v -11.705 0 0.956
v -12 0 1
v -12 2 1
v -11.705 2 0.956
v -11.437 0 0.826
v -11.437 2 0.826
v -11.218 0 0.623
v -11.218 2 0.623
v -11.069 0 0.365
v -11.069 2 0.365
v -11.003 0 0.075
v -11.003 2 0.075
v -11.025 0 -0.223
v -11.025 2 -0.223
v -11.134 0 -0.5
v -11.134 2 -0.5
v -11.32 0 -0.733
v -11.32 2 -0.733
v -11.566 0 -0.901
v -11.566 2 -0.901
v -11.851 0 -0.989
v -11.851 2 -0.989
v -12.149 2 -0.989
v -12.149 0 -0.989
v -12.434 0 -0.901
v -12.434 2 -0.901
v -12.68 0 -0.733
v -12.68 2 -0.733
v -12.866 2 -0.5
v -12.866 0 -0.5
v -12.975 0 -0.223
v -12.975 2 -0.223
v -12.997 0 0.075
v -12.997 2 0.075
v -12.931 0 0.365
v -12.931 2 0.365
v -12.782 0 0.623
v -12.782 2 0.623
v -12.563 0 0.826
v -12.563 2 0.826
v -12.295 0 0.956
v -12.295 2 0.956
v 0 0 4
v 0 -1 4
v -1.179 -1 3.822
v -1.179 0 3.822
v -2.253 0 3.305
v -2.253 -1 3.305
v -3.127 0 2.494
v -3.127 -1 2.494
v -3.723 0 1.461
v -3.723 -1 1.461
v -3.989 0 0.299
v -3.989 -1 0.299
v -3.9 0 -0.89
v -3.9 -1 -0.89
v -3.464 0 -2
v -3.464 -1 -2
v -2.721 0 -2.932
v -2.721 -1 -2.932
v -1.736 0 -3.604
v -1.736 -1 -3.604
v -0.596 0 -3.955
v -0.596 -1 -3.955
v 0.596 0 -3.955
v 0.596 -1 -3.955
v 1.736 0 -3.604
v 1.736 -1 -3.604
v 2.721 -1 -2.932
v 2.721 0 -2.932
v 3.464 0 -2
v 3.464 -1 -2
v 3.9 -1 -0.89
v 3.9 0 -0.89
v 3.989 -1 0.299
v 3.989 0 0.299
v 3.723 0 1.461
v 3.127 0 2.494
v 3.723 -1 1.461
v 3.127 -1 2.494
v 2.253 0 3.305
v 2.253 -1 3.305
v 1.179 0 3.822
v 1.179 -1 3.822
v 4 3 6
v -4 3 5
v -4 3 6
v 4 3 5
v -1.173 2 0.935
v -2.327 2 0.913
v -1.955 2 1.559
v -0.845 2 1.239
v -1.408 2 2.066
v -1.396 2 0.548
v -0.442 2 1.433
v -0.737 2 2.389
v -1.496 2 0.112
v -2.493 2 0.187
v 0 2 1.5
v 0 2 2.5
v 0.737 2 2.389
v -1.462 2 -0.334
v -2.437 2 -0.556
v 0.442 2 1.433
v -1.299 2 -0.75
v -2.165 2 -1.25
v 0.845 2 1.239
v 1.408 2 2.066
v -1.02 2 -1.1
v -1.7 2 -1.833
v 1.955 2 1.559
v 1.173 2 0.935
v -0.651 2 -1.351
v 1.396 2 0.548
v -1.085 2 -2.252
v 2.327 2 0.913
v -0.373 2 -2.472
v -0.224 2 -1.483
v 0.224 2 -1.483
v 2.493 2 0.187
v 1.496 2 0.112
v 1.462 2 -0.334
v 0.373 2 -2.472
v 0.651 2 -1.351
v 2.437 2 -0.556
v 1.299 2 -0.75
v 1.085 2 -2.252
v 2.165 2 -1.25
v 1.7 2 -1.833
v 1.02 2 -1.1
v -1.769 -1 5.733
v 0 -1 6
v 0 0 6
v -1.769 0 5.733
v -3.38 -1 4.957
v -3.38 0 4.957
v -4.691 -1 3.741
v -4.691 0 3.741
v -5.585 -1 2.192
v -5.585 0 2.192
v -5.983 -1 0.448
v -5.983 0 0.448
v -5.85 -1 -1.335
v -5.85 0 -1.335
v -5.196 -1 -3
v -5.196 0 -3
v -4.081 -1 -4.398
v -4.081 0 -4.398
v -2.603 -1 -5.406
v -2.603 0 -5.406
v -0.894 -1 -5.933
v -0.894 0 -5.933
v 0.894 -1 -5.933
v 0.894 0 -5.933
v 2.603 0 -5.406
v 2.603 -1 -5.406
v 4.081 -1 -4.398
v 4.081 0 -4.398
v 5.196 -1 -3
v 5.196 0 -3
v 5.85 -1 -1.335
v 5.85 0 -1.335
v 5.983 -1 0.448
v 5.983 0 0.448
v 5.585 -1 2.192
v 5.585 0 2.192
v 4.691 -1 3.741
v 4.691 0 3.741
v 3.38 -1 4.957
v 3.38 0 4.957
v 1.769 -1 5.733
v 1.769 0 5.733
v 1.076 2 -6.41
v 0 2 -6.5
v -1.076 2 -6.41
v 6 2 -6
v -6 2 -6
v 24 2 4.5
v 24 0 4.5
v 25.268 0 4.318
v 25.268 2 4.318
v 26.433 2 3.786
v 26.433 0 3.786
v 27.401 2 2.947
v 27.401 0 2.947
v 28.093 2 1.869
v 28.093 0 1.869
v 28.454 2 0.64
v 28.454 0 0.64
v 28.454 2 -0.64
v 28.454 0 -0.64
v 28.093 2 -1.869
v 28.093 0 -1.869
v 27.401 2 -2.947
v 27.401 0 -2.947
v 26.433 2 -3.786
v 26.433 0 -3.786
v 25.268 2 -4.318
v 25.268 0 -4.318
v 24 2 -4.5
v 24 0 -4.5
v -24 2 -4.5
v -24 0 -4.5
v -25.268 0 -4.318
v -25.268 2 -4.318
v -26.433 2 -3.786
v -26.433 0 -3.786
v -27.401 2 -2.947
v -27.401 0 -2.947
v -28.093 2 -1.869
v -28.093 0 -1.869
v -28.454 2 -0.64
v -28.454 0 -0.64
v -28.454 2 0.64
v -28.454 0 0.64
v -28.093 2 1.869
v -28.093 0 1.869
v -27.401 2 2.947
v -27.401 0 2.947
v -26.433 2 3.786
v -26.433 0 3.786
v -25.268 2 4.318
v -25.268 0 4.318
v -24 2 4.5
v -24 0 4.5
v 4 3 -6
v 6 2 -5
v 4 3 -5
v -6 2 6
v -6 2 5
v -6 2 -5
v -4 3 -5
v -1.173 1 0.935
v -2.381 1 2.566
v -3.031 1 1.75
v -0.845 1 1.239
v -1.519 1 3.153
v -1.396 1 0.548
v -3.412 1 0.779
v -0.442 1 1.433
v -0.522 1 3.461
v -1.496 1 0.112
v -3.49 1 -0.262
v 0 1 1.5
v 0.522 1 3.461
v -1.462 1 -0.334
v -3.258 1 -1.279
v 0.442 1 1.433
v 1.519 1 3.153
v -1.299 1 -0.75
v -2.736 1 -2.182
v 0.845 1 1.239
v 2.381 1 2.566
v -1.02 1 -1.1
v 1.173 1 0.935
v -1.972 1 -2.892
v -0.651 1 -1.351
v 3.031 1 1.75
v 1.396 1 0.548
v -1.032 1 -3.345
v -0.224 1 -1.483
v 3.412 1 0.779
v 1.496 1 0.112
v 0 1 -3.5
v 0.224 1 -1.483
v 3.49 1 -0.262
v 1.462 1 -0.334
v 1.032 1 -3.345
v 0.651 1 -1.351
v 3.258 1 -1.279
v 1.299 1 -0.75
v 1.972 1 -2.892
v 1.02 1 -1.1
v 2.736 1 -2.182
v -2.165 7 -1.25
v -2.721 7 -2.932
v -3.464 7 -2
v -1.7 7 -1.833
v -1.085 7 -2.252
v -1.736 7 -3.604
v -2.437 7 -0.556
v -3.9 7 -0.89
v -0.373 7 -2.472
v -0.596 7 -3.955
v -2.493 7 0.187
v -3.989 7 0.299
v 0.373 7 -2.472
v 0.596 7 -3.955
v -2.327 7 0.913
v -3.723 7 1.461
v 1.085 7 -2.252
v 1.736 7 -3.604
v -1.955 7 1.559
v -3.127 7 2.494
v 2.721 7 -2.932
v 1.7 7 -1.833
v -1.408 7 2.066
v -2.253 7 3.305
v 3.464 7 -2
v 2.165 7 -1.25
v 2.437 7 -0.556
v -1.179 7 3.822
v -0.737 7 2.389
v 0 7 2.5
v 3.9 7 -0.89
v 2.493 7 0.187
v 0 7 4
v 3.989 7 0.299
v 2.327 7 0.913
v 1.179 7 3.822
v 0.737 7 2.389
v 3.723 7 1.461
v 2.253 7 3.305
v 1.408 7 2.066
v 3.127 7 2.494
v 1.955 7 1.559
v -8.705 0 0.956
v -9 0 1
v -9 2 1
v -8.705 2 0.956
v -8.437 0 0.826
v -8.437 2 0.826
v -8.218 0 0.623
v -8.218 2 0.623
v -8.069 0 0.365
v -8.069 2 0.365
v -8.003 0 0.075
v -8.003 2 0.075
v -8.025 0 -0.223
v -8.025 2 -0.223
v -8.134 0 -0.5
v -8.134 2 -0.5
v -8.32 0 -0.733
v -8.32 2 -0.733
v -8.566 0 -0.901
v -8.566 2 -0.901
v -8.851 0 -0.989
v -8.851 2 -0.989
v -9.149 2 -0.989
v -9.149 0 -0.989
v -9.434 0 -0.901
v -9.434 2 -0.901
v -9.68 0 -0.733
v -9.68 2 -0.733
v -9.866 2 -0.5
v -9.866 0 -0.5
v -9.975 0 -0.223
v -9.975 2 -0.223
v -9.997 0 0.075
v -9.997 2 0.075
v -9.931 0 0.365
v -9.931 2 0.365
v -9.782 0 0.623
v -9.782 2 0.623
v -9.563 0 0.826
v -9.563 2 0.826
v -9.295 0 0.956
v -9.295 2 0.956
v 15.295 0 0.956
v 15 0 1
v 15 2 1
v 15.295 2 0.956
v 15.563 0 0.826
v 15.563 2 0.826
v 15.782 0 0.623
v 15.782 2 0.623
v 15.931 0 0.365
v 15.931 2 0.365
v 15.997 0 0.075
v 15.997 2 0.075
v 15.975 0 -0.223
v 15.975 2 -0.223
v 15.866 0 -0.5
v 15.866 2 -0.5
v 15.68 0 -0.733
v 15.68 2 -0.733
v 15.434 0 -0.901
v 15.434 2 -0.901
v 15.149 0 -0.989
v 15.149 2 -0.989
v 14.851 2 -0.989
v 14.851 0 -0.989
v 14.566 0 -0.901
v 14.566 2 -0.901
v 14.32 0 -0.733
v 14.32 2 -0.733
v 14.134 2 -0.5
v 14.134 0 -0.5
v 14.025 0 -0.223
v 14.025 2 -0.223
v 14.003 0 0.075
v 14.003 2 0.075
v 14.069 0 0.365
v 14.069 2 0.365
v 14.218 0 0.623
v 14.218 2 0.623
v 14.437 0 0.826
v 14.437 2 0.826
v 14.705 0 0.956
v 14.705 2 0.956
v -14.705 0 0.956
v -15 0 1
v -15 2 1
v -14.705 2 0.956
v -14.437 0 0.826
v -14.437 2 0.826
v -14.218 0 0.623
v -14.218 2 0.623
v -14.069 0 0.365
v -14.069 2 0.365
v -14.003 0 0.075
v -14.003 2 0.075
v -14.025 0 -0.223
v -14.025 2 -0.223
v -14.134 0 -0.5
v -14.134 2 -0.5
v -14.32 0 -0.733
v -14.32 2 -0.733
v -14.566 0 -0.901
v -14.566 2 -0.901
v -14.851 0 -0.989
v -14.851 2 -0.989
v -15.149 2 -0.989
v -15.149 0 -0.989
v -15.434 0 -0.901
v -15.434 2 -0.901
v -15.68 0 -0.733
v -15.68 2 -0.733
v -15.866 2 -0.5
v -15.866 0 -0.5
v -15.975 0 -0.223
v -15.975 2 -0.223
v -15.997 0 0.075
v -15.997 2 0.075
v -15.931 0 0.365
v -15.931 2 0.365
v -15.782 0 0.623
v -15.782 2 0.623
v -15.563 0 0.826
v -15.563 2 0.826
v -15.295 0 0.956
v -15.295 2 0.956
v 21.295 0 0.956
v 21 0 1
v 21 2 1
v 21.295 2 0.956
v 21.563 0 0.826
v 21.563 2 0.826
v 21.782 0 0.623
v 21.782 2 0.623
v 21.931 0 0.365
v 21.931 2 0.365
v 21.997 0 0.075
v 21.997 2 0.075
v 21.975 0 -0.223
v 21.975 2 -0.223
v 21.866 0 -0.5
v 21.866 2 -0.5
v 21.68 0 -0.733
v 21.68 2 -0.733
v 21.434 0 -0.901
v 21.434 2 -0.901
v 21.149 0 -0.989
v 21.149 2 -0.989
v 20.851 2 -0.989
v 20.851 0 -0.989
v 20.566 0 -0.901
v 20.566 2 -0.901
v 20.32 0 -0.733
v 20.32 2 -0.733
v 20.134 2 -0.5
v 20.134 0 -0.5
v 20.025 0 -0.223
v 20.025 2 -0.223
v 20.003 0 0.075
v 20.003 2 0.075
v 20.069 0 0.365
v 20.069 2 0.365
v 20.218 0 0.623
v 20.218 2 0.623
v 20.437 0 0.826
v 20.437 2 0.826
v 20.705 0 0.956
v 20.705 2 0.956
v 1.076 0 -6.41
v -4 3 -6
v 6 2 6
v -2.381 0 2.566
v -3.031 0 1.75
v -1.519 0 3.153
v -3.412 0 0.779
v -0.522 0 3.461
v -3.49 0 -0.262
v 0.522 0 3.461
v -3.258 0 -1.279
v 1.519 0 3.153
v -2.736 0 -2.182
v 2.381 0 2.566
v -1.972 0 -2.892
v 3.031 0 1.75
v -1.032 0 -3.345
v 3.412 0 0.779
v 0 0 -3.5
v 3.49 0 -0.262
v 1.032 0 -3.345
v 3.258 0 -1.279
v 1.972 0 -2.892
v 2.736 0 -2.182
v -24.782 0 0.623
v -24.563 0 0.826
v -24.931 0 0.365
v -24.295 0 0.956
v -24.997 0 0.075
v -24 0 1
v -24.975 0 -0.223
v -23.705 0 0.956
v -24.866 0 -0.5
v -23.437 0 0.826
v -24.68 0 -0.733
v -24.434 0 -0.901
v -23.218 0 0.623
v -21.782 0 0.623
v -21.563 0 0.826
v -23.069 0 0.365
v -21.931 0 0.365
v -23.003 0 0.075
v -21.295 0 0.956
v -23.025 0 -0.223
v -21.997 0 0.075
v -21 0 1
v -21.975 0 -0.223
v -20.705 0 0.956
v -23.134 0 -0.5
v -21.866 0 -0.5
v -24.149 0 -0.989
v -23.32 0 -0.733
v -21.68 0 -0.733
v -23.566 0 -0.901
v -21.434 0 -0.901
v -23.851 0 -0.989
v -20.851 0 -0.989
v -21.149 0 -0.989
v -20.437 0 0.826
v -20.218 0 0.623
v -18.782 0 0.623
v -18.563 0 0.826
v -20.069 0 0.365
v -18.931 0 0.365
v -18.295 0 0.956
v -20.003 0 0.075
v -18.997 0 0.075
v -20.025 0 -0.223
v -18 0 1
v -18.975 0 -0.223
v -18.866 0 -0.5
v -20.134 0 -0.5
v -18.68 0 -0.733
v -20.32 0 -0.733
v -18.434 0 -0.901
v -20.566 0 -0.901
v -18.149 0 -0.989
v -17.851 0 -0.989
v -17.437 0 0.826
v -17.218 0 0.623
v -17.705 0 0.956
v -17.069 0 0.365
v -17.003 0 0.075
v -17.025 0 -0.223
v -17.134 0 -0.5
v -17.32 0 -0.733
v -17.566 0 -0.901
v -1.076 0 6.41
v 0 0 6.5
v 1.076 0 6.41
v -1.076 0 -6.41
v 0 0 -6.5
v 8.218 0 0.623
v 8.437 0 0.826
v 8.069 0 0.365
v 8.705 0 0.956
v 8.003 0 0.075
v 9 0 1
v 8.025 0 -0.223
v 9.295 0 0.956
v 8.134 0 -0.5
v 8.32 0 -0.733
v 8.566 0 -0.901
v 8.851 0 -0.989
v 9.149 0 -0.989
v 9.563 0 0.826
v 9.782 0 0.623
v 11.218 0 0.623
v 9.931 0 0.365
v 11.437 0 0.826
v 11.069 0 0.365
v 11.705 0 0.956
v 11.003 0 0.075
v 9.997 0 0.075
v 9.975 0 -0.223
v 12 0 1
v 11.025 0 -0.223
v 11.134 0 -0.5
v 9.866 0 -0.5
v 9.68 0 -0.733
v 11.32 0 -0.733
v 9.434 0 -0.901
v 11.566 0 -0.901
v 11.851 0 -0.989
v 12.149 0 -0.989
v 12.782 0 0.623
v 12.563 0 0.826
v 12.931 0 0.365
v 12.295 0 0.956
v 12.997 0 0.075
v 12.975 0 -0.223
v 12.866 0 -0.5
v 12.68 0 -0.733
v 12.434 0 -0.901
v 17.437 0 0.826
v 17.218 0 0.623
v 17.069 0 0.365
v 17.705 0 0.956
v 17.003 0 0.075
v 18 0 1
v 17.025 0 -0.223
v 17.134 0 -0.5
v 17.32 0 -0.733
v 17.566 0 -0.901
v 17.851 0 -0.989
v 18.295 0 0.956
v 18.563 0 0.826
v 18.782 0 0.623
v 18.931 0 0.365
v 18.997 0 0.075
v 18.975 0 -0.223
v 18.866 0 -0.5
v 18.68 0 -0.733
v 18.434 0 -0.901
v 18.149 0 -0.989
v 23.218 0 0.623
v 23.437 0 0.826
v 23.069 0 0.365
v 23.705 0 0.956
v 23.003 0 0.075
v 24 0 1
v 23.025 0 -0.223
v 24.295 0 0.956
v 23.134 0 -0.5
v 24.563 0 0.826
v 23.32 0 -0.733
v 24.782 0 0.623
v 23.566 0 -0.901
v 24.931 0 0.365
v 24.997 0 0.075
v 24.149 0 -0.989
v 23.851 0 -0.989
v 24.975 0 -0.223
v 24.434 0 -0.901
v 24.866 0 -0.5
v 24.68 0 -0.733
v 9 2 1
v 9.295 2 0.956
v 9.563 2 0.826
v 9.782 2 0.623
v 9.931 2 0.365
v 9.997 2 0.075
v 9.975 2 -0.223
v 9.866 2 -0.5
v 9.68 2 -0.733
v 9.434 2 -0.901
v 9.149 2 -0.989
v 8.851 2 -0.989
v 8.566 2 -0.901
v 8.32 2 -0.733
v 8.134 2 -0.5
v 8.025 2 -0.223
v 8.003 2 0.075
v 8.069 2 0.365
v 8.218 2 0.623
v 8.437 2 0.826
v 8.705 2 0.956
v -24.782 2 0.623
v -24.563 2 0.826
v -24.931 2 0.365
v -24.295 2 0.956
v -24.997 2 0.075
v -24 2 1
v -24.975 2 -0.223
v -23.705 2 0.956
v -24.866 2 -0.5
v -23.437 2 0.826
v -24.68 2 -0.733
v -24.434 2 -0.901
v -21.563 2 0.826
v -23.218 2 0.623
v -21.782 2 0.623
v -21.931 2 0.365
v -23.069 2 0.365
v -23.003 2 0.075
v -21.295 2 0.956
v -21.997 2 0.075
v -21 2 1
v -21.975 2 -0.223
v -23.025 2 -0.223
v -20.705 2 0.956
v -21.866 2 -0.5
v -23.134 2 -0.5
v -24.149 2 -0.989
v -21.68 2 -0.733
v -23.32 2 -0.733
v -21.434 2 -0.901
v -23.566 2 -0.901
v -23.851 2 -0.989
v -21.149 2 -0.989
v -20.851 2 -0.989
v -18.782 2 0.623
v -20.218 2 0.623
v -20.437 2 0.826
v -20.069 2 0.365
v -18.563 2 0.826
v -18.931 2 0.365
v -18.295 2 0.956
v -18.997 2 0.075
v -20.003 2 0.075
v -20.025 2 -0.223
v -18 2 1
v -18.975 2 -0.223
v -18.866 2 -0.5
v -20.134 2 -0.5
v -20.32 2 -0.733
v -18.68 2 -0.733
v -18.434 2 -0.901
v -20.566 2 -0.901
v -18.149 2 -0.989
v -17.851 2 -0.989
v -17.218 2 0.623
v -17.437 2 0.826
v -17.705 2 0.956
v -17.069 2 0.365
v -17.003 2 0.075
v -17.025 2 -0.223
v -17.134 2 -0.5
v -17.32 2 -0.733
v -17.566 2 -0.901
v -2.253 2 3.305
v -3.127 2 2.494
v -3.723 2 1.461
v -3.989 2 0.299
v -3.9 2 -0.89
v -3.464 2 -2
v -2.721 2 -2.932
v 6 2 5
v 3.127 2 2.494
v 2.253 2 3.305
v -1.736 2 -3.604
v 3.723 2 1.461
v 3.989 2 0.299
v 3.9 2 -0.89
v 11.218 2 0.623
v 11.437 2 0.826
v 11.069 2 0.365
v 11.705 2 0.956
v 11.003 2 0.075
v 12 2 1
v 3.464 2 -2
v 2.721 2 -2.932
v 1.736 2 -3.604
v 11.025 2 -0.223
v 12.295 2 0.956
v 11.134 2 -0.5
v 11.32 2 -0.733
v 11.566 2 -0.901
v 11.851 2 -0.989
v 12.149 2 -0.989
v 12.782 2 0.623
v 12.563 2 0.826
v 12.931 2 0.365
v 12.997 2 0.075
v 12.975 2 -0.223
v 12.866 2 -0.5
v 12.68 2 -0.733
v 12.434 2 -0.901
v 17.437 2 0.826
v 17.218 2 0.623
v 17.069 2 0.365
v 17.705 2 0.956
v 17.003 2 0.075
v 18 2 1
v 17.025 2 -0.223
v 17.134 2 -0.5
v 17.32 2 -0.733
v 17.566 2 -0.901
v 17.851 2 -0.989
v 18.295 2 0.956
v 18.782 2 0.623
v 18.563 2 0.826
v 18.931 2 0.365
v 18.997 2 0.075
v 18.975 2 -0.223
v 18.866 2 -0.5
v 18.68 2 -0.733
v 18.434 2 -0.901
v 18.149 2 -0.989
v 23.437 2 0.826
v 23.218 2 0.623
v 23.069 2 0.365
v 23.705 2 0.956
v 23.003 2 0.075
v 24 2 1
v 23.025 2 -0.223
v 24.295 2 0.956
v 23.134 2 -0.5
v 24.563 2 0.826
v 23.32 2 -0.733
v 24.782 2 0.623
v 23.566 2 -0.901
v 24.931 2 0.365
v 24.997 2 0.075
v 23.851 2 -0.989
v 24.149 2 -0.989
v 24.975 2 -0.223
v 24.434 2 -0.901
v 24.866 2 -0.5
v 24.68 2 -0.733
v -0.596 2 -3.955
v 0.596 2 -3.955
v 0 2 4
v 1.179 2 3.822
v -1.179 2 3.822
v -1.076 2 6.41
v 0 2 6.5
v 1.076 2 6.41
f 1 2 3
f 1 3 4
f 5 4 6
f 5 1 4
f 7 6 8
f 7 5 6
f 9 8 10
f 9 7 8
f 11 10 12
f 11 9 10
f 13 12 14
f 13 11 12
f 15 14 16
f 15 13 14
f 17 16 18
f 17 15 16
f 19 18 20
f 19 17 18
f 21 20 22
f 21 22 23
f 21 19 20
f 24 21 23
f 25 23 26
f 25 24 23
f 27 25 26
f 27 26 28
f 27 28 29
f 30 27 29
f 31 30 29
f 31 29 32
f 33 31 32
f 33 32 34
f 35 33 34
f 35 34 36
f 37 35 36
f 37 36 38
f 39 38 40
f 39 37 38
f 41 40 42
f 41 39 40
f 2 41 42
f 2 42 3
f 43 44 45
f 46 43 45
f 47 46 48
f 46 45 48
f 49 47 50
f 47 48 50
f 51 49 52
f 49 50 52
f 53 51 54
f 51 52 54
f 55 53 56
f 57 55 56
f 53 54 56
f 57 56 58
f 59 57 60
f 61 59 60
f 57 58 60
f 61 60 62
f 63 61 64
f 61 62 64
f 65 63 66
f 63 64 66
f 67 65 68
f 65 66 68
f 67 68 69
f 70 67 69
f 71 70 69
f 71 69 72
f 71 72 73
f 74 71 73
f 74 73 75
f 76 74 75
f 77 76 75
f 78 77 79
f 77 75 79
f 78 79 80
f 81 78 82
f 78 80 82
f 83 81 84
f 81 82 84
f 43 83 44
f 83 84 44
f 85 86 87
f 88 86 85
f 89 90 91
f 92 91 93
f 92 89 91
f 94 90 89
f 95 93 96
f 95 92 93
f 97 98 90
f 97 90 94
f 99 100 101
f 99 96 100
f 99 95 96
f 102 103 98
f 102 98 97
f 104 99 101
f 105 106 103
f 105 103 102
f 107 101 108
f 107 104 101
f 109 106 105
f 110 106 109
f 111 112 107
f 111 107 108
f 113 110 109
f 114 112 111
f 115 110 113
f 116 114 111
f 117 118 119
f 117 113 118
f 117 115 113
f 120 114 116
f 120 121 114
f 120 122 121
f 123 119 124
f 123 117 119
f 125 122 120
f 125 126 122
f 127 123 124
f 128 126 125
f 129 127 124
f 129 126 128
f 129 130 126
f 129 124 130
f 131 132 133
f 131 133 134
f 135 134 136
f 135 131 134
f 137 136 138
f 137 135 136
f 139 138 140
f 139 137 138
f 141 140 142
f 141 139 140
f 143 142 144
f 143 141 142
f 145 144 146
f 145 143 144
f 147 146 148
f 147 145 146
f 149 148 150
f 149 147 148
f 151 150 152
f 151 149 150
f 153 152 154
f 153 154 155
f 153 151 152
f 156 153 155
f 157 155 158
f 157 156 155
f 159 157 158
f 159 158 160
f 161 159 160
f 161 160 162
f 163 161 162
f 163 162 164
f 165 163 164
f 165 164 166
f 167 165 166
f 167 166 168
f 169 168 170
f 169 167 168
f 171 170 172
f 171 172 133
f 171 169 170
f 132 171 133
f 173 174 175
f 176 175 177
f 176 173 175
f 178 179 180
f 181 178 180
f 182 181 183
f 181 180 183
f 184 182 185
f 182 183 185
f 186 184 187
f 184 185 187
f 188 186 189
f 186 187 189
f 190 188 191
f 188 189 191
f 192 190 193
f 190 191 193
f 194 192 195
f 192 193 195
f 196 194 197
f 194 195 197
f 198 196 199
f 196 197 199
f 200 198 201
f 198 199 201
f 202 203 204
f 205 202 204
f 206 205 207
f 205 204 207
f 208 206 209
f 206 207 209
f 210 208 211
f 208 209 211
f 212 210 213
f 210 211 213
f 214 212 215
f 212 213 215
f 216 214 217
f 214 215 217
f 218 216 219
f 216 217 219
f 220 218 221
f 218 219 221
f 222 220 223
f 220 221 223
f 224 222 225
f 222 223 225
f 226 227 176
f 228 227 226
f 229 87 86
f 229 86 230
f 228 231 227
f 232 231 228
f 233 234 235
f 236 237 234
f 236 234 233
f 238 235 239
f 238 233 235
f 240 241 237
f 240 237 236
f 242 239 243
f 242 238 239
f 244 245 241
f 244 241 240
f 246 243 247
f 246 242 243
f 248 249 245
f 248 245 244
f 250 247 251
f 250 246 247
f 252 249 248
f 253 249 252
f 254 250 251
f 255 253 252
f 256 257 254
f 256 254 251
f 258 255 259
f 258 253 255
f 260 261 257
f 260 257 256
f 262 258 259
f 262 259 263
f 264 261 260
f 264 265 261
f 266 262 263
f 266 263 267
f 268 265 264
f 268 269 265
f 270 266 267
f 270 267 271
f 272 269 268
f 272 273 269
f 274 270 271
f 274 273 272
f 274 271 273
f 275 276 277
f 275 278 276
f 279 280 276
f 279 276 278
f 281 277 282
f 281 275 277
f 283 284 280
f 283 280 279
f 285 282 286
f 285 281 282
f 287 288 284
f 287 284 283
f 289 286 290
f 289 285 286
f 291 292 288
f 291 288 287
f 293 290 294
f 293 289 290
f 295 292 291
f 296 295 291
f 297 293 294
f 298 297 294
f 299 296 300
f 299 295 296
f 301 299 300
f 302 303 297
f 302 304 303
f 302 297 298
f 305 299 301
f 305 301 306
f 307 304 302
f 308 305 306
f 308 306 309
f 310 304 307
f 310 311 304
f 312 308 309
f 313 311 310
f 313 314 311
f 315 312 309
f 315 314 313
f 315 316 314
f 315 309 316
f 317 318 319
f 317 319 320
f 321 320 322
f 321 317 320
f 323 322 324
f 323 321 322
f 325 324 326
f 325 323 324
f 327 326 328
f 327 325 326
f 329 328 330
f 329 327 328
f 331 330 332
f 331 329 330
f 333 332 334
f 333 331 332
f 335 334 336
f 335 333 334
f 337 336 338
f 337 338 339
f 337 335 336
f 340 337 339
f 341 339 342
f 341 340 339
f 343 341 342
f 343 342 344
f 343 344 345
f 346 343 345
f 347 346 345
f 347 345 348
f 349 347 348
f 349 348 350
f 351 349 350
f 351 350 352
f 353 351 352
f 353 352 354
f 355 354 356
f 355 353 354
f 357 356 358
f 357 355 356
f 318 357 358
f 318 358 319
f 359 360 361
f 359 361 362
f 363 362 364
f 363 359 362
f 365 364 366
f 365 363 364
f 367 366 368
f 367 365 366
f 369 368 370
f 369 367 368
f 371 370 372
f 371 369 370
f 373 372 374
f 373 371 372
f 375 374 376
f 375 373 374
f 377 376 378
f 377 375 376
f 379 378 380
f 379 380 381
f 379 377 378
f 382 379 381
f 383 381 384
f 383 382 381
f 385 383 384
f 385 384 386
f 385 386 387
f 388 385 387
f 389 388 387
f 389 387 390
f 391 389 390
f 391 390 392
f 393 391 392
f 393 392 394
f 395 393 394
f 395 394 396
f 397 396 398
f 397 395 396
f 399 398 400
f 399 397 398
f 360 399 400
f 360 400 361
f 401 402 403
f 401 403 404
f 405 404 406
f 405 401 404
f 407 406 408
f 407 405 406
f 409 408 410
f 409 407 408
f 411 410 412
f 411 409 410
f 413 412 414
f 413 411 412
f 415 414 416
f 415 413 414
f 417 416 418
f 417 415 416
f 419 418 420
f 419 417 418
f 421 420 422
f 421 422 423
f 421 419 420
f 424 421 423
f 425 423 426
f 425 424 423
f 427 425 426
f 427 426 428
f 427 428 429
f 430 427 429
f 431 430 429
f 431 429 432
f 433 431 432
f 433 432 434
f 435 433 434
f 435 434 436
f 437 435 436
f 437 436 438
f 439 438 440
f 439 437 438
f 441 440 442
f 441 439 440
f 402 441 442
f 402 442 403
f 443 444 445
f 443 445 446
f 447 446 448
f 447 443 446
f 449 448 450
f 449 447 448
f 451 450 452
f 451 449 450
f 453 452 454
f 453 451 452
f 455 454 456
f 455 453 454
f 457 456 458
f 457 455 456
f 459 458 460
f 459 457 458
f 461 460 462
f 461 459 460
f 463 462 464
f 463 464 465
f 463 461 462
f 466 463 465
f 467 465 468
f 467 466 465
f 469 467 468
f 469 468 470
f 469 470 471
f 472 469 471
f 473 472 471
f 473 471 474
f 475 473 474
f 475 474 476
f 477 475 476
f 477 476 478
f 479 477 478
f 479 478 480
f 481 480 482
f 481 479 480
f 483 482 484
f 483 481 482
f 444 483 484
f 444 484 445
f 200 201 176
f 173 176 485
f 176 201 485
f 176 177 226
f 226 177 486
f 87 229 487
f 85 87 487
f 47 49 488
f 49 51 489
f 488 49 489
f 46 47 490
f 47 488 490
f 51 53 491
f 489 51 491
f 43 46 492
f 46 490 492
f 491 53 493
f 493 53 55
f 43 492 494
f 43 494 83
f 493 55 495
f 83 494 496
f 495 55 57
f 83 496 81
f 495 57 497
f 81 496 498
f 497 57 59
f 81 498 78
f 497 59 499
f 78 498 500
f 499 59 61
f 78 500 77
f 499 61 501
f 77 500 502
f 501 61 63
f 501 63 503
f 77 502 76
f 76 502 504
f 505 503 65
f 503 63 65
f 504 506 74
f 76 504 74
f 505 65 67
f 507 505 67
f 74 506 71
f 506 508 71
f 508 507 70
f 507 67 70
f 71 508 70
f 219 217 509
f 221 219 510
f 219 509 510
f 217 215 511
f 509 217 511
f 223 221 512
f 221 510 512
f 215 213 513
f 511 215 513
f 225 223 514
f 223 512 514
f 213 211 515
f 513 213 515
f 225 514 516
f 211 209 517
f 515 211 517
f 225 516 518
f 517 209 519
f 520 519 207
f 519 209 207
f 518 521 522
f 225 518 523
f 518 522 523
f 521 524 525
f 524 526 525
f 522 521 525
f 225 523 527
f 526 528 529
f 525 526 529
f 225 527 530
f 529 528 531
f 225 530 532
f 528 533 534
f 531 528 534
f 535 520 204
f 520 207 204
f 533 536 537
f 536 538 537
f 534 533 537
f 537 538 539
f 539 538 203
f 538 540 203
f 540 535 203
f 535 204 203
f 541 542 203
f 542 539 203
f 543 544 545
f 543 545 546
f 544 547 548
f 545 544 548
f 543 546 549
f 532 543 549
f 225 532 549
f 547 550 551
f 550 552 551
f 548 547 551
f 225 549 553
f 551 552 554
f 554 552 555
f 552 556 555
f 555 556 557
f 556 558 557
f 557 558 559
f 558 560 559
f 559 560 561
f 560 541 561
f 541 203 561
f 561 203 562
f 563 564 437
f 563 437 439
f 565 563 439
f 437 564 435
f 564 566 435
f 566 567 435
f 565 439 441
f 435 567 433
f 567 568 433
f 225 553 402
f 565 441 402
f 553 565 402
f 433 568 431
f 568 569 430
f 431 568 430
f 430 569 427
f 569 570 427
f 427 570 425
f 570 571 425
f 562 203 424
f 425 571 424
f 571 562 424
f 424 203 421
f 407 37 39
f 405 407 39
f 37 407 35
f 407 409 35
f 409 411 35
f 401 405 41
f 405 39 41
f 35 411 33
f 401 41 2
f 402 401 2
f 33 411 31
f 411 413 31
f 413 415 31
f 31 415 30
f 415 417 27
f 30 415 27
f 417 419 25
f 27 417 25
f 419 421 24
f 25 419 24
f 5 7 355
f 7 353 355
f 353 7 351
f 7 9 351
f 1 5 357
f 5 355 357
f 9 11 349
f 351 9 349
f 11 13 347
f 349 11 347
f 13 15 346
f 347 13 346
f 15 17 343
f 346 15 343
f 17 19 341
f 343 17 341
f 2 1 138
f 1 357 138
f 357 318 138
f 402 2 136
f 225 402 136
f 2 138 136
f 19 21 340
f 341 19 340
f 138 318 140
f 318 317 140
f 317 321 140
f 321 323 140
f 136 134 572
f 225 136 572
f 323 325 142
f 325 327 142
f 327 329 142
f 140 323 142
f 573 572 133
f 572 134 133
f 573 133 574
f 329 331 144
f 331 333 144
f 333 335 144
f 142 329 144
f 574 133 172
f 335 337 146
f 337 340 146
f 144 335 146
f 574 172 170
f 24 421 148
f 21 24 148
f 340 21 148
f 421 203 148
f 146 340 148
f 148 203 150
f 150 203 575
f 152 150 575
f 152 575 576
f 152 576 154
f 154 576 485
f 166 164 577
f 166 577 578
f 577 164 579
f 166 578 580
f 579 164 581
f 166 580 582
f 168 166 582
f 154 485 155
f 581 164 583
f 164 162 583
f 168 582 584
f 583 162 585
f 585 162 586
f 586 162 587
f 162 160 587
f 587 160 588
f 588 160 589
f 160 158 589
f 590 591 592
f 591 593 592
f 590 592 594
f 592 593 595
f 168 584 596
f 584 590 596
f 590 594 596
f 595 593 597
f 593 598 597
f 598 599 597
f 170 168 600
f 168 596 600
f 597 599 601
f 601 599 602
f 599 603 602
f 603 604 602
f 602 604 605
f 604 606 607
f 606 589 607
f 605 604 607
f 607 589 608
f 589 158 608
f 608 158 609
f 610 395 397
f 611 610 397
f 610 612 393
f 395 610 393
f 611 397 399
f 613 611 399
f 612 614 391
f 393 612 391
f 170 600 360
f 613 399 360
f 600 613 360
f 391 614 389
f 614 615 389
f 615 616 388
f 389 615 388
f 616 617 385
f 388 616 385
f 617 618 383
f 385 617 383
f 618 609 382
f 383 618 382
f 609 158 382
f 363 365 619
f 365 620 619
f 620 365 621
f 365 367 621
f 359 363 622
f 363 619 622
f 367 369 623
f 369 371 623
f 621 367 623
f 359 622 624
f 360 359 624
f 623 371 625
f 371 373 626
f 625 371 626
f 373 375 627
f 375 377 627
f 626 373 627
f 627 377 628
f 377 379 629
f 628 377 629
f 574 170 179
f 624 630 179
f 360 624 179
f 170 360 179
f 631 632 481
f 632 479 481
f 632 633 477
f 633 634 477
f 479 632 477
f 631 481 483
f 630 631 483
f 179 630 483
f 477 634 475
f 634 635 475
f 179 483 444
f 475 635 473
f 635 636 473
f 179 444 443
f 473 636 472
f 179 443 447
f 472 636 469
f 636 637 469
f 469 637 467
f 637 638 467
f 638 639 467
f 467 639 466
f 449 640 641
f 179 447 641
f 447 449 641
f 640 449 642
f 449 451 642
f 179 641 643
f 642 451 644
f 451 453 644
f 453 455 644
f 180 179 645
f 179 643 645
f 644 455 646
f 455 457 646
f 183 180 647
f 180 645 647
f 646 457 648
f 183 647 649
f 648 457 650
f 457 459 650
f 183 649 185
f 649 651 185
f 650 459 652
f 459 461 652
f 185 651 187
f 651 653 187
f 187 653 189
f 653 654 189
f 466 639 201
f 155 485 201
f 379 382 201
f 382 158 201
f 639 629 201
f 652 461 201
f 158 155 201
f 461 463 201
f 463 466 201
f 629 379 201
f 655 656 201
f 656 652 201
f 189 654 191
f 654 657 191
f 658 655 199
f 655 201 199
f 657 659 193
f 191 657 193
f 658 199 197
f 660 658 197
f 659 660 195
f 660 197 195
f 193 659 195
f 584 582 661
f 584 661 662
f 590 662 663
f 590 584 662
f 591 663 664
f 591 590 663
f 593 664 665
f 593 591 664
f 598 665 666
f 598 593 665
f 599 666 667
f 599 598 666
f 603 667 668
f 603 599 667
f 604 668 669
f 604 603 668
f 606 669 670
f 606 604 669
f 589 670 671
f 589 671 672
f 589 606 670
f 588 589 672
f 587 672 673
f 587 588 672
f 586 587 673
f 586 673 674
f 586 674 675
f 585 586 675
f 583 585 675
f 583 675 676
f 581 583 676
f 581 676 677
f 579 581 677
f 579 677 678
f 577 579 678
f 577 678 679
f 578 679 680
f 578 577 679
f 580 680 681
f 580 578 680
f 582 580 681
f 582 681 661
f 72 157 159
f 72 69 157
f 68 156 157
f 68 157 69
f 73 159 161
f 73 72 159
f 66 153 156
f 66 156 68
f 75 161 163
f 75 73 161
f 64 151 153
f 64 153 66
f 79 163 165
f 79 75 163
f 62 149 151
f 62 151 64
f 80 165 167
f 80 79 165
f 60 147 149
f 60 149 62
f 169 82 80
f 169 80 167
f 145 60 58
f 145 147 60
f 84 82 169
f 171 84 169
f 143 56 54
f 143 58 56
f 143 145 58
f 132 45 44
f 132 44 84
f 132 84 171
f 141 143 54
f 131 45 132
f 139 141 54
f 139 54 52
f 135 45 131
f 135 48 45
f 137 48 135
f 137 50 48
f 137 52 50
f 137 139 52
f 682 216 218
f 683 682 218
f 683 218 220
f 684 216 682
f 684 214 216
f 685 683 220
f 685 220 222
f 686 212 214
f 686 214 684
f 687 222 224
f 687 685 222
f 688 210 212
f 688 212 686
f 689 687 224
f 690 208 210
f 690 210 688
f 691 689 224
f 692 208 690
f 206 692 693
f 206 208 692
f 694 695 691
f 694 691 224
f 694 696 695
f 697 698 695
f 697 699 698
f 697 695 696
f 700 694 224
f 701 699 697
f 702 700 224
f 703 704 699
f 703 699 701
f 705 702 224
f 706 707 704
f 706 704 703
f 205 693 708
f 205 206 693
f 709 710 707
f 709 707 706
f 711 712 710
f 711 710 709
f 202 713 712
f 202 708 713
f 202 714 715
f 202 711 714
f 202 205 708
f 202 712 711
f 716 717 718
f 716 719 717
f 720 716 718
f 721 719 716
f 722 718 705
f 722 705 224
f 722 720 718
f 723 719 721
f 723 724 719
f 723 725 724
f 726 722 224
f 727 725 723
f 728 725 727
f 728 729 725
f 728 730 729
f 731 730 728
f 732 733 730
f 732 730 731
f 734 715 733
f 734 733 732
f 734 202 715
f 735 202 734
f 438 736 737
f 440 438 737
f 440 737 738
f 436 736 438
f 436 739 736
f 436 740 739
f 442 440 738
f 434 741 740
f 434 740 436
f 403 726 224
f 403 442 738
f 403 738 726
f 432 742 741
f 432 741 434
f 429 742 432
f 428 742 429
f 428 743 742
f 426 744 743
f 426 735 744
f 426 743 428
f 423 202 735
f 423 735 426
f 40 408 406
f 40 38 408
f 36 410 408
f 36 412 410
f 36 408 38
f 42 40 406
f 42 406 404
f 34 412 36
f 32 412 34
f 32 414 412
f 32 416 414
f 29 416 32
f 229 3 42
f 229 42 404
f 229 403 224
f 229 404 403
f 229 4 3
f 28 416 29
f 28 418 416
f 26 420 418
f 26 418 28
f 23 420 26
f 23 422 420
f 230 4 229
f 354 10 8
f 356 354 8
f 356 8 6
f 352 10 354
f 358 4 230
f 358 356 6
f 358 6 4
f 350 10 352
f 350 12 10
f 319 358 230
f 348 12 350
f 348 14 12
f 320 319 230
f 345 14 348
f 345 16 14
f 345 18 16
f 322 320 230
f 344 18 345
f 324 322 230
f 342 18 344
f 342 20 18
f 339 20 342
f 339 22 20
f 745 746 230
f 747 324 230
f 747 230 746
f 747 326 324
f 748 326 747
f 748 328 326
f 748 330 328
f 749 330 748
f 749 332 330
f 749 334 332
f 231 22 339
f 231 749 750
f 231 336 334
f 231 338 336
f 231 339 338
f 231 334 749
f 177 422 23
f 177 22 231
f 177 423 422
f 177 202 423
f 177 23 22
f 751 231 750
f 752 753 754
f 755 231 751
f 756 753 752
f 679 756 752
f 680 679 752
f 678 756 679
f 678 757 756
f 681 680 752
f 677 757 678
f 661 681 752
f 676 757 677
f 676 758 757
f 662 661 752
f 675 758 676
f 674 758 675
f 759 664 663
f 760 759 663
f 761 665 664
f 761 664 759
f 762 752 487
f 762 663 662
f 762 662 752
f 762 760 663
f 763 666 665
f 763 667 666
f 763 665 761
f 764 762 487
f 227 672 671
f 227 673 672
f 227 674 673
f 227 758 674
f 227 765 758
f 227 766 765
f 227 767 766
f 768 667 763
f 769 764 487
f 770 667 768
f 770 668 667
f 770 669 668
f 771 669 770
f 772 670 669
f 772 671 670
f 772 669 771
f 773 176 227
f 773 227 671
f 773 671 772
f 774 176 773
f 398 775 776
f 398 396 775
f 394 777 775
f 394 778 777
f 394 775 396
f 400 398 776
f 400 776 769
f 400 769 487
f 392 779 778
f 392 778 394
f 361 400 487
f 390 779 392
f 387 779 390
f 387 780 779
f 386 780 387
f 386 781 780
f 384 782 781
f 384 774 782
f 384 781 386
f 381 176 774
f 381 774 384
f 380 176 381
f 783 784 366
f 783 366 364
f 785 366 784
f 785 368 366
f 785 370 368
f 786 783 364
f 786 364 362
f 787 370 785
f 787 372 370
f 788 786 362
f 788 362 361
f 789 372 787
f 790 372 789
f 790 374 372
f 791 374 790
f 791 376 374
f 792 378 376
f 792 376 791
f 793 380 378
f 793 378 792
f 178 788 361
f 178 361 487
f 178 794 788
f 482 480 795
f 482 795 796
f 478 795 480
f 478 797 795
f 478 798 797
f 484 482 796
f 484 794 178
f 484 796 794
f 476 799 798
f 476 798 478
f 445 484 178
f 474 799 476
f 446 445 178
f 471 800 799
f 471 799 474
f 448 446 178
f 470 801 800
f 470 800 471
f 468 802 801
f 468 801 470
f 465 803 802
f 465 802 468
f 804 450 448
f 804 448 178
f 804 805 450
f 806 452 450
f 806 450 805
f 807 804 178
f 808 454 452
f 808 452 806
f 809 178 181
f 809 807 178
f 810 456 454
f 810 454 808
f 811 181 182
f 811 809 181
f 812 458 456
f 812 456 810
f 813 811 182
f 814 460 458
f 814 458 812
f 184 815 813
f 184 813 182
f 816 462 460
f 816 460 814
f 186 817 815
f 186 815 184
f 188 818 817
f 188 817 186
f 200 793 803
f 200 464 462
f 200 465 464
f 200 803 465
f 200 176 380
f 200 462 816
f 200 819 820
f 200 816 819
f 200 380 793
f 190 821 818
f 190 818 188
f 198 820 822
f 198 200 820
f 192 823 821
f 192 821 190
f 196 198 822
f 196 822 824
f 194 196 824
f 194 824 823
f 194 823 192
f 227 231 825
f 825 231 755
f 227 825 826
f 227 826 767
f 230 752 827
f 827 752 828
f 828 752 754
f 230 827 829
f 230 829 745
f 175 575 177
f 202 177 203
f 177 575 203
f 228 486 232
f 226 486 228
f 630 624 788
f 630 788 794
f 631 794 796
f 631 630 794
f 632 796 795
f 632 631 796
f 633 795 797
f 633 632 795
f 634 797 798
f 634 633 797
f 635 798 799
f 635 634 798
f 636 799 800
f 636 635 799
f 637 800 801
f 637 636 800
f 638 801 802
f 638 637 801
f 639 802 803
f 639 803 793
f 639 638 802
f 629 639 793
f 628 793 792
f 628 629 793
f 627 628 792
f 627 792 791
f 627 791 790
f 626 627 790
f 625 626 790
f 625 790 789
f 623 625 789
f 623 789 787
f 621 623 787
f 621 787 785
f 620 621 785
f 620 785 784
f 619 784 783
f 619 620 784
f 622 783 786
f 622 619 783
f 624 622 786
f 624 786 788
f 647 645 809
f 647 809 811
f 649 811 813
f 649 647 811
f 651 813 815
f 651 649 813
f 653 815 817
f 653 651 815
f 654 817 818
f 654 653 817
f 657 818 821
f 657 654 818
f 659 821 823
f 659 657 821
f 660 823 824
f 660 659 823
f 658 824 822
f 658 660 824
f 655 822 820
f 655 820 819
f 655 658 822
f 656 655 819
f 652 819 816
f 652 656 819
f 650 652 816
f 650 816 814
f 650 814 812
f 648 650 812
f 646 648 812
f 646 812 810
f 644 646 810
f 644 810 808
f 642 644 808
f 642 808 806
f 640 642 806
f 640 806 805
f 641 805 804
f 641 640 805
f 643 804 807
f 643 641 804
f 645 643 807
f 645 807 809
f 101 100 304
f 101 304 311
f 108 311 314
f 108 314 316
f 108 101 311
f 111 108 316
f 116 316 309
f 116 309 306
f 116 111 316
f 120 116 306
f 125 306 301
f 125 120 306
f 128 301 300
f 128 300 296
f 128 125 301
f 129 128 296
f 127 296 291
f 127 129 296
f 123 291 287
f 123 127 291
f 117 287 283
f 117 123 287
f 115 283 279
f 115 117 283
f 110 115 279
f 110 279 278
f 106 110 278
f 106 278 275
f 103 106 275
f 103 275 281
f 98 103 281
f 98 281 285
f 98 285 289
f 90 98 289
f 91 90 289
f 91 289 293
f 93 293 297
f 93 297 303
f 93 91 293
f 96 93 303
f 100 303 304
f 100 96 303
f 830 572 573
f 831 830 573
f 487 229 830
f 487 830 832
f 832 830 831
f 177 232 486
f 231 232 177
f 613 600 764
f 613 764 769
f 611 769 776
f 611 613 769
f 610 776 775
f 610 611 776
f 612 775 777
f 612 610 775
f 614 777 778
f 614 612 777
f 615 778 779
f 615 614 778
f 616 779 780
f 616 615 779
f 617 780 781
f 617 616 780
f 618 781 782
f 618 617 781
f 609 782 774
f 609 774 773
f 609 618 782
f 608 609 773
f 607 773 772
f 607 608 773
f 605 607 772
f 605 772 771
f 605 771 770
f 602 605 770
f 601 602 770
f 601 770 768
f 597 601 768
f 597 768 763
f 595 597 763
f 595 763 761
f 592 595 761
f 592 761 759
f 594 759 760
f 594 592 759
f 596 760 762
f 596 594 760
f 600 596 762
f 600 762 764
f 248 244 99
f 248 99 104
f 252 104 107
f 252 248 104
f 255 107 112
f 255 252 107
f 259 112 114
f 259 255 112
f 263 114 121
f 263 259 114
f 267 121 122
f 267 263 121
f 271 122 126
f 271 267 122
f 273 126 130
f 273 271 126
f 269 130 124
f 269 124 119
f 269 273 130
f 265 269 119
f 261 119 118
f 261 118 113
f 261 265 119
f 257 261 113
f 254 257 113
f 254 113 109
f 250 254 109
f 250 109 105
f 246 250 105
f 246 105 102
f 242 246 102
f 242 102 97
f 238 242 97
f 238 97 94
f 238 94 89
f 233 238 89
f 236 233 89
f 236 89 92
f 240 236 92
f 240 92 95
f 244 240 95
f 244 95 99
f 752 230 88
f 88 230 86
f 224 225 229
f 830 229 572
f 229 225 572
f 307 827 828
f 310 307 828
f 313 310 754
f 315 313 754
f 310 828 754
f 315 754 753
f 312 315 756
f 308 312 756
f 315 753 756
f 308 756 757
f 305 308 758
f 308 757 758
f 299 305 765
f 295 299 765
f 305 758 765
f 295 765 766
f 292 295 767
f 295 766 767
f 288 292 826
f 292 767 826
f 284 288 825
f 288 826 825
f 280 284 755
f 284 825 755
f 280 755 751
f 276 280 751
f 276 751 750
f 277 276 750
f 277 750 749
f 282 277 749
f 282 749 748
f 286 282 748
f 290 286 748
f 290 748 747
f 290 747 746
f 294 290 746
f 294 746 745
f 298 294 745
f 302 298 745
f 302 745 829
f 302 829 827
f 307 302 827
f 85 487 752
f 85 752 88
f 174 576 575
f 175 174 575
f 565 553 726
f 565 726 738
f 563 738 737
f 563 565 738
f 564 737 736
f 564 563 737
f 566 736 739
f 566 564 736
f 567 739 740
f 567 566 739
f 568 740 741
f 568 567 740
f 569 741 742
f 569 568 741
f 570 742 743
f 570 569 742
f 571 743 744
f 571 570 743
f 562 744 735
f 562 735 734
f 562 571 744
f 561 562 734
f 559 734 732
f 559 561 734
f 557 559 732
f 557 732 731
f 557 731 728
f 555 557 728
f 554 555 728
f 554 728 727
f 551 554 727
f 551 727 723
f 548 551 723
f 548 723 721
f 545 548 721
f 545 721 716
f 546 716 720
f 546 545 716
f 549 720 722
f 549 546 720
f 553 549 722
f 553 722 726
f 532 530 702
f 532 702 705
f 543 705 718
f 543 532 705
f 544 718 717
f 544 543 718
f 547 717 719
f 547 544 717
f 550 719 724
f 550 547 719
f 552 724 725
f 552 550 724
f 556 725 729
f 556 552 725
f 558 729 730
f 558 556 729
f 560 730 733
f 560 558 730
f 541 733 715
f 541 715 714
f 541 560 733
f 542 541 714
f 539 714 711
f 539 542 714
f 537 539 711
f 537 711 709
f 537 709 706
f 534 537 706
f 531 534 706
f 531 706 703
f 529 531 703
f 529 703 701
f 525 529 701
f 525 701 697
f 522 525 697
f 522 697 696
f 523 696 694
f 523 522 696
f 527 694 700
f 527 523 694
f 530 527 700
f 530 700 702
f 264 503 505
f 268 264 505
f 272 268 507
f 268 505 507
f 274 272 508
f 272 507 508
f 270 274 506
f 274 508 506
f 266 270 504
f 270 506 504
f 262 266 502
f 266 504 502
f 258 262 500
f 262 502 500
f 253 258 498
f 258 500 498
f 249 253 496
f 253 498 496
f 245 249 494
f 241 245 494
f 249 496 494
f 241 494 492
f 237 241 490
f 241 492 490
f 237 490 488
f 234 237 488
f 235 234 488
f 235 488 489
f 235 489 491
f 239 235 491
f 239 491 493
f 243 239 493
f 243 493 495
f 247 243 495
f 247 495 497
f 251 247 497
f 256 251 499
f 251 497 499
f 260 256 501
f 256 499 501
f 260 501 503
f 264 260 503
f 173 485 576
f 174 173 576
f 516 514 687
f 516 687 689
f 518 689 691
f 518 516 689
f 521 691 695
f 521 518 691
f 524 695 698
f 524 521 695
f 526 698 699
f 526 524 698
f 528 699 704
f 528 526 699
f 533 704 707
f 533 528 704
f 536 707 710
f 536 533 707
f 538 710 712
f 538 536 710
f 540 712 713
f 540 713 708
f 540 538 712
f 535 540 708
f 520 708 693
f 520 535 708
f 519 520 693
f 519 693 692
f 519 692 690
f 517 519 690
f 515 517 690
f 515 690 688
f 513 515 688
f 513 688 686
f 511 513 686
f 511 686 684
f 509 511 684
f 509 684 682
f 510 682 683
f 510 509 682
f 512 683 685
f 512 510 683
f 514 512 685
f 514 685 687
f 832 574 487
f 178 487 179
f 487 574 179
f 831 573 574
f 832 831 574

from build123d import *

# Parameters (mm, degrees)
SKETCH1_R           = 1
SKETCH1_R_2         = 1.5
BOSS_EXTRUDE1_DEPTH = 2
SKETCH2_R           = 4
SKETCH2_R_2         = 2.5
BOSS_EXTRUDE2_DEPTH = 5
BOSS_EXTRUDE3_START = 1
SKETCH3_R           = 6
SKETCH3_R_2         = 4
BOSS_EXTRUDE3_DEPTH = 1
SKETCH4_R           = 3.5
CUT_EXTRUDE1_DEPTH  = 1
SKETCH5_W           = 12
SKETCH5_H           = 1
BOSS_EXTRUDE4_DEPTH = 1
CUT_EXTRUDE2_DEPTH  = 20


with BuildPart() as part:
    # Sketch1 → Boss-Extrude1 (new body)
    # profile 1 of 3: a face of its own
    with BuildSketch(Plane(origin=(0, 0, 0), x_dir=(1, 0, 0), z_dir=(0, 1, 0))):
        with BuildLine():
            Line((-1.075862069, 6.410344828), (-24, 4.5))
            ThreePointArc((-24, 4.5), (-28.5, 0), (-24, -4.5))
            Line((-24, -4.5), (-1.075862069, -6.410344828))
            ThreePointArc((-1.075862069, -6.410344828), (-6.5, 0), (-1.075862069, 6.410344828))
        make_face()
        with Locations(Location((-21, 0, 0), (0, 0, 270))):
            Circle(SKETCH1_R, mode=Mode.SUBTRACT)
        with Locations(Location((-18, 0, 0), (0, 0, 270))):
            Circle(SKETCH1_R, mode=Mode.SUBTRACT)
        with Locations(Location((-15, 0, 0), (0, 0, 270))):
            Circle(SKETCH1_R, mode=Mode.SUBTRACT)
        with Locations(Location((-12, 0, 0), (0, 0, 270))):
            Circle(SKETCH1_R, mode=Mode.SUBTRACT)
        with Locations(Location((-9, 0, 0), (0, 0, 270))):
            Circle(SKETCH1_R, mode=Mode.SUBTRACT)
        with Locations(Location((-24, 0, 0), (0, 0, 270))):
            Circle(SKETCH1_R, mode=Mode.SUBTRACT)
    # profile 2 of 3: a face of its own
    with BuildSketch(Plane(origin=(0, 0, 0), x_dir=(1, 0, 0), z_dir=(0, 1, 0))):
        with BuildLine():
            Line((0, 6.5), (-1.075862069, 6.410344828))
            ThreePointArc((-1.075862069, 6.410344828), (-6.5, 0), (-1.075862069, -6.410344828))
            Line((-1.075862069, -6.410344828), (0, -6.5))
            Line((0, -6.5), (1.075862069, -6.410344828))
            ThreePointArc((1.075862069, -6.410344828), (4.962010855, -4.19862457), (6.5, 0))
            ThreePointArc((6.5, 0), (4.962010855, 4.19862457), (1.075862069, 6.410344828))
            Line((1.075862069, 6.410344828), (0, 6.5))
        make_face()
        with Locations(Location((0, 0, 0), (0, 0, 270))):
            Circle(SKETCH1_R_2, mode=Mode.SUBTRACT)
    # profile 3 of 3: a face of its own
    with BuildSketch(Plane(origin=(0, 0, 0), x_dir=(1, 0, 0), z_dir=(0, 1, 0))):
        with BuildLine():
            Line((24, 4.5), (1.075862069, 6.410344828))
            ThreePointArc((1.075862069, 6.410344828), (4.962010855, 4.19862457), (6.5, 0))
            ThreePointArc((6.5, 0), (4.962010855, -4.19862457), (1.075862069, -6.410344828))
            Line((1.075862069, -6.410344828), (24, -4.5))
            ThreePointArc((24, -4.5), (28.5, 0), (24, 4.5))
        make_face()
        with Locations(Location((9, 0, 0), (0, 0, 270))):
            Circle(SKETCH1_R, mode=Mode.SUBTRACT)
        with Locations(Location((12, 0, 0), (0, 0, 270))):
            Circle(SKETCH1_R, mode=Mode.SUBTRACT)
        with Locations(Location((15, 0, 0), (0, 0, 270))):
            Circle(SKETCH1_R, mode=Mode.SUBTRACT)
        with Locations(Location((18, 0, 0), (0, 0, 270))):
            Circle(SKETCH1_R, mode=Mode.SUBTRACT)
        with Locations(Location((21, 0, 0), (0, 0, 270))):
            Circle(SKETCH1_R, mode=Mode.SUBTRACT)
        with Locations(Location((24, 0, 0), (0, 0, 270))):
            Circle(SKETCH1_R, mode=Mode.SUBTRACT)
    extrude(amount=BOSS_EXTRUDE1_DEPTH)

    # Sketch2 → Boss-Extrude2 (add)
    with BuildSketch(Plane(origin=(0, 2, 0), x_dir=(1, 0, 0), z_dir=(0, 1, 0))):
        with Locations(Location((0, 0, 0), (0, 0, 270))):
            Circle(SKETCH2_R)
        with Locations(Location((0, 0, 0), (0, 0, 270))):
            Circle(SKETCH2_R_2, mode=Mode.SUBTRACT)
    extrude(amount=BOSS_EXTRUDE2_DEPTH)

    # Sketch3 → Boss-Extrude3 (add)
    with BuildSketch(Plane.XZ.offset(BOSS_EXTRUDE3_START)):
        with Locations(Location((0, 0, 0), (0, 0, 90))):
            Circle(SKETCH3_R)
        with Locations(Location((0, 0, 0), (0, 0, 90))):
            Circle(SKETCH3_R_2, mode=Mode.SUBTRACT)
    extrude(amount=-BOSS_EXTRUDE3_DEPTH)

    # Sketch4 → Cut-Extrude1 (cut)
    with BuildSketch(Plane.XZ):
        with Locations(Location((0, 0, 0), (0, 0, 270))):
            Circle(SKETCH4_R)
    extrude(amount=-CUT_EXTRUDE1_DEPTH, mode=Mode.SUBTRACT)

    # Sketch5 → Boss-Extrude4 (add)
    with BuildSketch(Plane(origin=(0, 2, 0), x_dir=(1, 0, 0), z_dir=(0, 1, 0))):
        with Locations((0, 5.5)):
            Rectangle(SKETCH5_W, SKETCH5_H)
        with Locations((0, -5.5)):
            Rectangle(SKETCH5_W, SKETCH5_H)
    extrude(amount=BOSS_EXTRUDE4_DEPTH)

    # Sketch6 → Cut-Extrude2 (cut)
    with BuildSketch(Plane.XY.offset(6)):
        Polygon((-4, 3), (-6, 2), (-6, 3), align=None)
        Polygon((6, 2), (4, 3), (6, 3), align=None)
    extrude(amount=-CUT_EXTRUDE2_DEPTH, mode=Mode.SUBTRACT)


solid = part.part
